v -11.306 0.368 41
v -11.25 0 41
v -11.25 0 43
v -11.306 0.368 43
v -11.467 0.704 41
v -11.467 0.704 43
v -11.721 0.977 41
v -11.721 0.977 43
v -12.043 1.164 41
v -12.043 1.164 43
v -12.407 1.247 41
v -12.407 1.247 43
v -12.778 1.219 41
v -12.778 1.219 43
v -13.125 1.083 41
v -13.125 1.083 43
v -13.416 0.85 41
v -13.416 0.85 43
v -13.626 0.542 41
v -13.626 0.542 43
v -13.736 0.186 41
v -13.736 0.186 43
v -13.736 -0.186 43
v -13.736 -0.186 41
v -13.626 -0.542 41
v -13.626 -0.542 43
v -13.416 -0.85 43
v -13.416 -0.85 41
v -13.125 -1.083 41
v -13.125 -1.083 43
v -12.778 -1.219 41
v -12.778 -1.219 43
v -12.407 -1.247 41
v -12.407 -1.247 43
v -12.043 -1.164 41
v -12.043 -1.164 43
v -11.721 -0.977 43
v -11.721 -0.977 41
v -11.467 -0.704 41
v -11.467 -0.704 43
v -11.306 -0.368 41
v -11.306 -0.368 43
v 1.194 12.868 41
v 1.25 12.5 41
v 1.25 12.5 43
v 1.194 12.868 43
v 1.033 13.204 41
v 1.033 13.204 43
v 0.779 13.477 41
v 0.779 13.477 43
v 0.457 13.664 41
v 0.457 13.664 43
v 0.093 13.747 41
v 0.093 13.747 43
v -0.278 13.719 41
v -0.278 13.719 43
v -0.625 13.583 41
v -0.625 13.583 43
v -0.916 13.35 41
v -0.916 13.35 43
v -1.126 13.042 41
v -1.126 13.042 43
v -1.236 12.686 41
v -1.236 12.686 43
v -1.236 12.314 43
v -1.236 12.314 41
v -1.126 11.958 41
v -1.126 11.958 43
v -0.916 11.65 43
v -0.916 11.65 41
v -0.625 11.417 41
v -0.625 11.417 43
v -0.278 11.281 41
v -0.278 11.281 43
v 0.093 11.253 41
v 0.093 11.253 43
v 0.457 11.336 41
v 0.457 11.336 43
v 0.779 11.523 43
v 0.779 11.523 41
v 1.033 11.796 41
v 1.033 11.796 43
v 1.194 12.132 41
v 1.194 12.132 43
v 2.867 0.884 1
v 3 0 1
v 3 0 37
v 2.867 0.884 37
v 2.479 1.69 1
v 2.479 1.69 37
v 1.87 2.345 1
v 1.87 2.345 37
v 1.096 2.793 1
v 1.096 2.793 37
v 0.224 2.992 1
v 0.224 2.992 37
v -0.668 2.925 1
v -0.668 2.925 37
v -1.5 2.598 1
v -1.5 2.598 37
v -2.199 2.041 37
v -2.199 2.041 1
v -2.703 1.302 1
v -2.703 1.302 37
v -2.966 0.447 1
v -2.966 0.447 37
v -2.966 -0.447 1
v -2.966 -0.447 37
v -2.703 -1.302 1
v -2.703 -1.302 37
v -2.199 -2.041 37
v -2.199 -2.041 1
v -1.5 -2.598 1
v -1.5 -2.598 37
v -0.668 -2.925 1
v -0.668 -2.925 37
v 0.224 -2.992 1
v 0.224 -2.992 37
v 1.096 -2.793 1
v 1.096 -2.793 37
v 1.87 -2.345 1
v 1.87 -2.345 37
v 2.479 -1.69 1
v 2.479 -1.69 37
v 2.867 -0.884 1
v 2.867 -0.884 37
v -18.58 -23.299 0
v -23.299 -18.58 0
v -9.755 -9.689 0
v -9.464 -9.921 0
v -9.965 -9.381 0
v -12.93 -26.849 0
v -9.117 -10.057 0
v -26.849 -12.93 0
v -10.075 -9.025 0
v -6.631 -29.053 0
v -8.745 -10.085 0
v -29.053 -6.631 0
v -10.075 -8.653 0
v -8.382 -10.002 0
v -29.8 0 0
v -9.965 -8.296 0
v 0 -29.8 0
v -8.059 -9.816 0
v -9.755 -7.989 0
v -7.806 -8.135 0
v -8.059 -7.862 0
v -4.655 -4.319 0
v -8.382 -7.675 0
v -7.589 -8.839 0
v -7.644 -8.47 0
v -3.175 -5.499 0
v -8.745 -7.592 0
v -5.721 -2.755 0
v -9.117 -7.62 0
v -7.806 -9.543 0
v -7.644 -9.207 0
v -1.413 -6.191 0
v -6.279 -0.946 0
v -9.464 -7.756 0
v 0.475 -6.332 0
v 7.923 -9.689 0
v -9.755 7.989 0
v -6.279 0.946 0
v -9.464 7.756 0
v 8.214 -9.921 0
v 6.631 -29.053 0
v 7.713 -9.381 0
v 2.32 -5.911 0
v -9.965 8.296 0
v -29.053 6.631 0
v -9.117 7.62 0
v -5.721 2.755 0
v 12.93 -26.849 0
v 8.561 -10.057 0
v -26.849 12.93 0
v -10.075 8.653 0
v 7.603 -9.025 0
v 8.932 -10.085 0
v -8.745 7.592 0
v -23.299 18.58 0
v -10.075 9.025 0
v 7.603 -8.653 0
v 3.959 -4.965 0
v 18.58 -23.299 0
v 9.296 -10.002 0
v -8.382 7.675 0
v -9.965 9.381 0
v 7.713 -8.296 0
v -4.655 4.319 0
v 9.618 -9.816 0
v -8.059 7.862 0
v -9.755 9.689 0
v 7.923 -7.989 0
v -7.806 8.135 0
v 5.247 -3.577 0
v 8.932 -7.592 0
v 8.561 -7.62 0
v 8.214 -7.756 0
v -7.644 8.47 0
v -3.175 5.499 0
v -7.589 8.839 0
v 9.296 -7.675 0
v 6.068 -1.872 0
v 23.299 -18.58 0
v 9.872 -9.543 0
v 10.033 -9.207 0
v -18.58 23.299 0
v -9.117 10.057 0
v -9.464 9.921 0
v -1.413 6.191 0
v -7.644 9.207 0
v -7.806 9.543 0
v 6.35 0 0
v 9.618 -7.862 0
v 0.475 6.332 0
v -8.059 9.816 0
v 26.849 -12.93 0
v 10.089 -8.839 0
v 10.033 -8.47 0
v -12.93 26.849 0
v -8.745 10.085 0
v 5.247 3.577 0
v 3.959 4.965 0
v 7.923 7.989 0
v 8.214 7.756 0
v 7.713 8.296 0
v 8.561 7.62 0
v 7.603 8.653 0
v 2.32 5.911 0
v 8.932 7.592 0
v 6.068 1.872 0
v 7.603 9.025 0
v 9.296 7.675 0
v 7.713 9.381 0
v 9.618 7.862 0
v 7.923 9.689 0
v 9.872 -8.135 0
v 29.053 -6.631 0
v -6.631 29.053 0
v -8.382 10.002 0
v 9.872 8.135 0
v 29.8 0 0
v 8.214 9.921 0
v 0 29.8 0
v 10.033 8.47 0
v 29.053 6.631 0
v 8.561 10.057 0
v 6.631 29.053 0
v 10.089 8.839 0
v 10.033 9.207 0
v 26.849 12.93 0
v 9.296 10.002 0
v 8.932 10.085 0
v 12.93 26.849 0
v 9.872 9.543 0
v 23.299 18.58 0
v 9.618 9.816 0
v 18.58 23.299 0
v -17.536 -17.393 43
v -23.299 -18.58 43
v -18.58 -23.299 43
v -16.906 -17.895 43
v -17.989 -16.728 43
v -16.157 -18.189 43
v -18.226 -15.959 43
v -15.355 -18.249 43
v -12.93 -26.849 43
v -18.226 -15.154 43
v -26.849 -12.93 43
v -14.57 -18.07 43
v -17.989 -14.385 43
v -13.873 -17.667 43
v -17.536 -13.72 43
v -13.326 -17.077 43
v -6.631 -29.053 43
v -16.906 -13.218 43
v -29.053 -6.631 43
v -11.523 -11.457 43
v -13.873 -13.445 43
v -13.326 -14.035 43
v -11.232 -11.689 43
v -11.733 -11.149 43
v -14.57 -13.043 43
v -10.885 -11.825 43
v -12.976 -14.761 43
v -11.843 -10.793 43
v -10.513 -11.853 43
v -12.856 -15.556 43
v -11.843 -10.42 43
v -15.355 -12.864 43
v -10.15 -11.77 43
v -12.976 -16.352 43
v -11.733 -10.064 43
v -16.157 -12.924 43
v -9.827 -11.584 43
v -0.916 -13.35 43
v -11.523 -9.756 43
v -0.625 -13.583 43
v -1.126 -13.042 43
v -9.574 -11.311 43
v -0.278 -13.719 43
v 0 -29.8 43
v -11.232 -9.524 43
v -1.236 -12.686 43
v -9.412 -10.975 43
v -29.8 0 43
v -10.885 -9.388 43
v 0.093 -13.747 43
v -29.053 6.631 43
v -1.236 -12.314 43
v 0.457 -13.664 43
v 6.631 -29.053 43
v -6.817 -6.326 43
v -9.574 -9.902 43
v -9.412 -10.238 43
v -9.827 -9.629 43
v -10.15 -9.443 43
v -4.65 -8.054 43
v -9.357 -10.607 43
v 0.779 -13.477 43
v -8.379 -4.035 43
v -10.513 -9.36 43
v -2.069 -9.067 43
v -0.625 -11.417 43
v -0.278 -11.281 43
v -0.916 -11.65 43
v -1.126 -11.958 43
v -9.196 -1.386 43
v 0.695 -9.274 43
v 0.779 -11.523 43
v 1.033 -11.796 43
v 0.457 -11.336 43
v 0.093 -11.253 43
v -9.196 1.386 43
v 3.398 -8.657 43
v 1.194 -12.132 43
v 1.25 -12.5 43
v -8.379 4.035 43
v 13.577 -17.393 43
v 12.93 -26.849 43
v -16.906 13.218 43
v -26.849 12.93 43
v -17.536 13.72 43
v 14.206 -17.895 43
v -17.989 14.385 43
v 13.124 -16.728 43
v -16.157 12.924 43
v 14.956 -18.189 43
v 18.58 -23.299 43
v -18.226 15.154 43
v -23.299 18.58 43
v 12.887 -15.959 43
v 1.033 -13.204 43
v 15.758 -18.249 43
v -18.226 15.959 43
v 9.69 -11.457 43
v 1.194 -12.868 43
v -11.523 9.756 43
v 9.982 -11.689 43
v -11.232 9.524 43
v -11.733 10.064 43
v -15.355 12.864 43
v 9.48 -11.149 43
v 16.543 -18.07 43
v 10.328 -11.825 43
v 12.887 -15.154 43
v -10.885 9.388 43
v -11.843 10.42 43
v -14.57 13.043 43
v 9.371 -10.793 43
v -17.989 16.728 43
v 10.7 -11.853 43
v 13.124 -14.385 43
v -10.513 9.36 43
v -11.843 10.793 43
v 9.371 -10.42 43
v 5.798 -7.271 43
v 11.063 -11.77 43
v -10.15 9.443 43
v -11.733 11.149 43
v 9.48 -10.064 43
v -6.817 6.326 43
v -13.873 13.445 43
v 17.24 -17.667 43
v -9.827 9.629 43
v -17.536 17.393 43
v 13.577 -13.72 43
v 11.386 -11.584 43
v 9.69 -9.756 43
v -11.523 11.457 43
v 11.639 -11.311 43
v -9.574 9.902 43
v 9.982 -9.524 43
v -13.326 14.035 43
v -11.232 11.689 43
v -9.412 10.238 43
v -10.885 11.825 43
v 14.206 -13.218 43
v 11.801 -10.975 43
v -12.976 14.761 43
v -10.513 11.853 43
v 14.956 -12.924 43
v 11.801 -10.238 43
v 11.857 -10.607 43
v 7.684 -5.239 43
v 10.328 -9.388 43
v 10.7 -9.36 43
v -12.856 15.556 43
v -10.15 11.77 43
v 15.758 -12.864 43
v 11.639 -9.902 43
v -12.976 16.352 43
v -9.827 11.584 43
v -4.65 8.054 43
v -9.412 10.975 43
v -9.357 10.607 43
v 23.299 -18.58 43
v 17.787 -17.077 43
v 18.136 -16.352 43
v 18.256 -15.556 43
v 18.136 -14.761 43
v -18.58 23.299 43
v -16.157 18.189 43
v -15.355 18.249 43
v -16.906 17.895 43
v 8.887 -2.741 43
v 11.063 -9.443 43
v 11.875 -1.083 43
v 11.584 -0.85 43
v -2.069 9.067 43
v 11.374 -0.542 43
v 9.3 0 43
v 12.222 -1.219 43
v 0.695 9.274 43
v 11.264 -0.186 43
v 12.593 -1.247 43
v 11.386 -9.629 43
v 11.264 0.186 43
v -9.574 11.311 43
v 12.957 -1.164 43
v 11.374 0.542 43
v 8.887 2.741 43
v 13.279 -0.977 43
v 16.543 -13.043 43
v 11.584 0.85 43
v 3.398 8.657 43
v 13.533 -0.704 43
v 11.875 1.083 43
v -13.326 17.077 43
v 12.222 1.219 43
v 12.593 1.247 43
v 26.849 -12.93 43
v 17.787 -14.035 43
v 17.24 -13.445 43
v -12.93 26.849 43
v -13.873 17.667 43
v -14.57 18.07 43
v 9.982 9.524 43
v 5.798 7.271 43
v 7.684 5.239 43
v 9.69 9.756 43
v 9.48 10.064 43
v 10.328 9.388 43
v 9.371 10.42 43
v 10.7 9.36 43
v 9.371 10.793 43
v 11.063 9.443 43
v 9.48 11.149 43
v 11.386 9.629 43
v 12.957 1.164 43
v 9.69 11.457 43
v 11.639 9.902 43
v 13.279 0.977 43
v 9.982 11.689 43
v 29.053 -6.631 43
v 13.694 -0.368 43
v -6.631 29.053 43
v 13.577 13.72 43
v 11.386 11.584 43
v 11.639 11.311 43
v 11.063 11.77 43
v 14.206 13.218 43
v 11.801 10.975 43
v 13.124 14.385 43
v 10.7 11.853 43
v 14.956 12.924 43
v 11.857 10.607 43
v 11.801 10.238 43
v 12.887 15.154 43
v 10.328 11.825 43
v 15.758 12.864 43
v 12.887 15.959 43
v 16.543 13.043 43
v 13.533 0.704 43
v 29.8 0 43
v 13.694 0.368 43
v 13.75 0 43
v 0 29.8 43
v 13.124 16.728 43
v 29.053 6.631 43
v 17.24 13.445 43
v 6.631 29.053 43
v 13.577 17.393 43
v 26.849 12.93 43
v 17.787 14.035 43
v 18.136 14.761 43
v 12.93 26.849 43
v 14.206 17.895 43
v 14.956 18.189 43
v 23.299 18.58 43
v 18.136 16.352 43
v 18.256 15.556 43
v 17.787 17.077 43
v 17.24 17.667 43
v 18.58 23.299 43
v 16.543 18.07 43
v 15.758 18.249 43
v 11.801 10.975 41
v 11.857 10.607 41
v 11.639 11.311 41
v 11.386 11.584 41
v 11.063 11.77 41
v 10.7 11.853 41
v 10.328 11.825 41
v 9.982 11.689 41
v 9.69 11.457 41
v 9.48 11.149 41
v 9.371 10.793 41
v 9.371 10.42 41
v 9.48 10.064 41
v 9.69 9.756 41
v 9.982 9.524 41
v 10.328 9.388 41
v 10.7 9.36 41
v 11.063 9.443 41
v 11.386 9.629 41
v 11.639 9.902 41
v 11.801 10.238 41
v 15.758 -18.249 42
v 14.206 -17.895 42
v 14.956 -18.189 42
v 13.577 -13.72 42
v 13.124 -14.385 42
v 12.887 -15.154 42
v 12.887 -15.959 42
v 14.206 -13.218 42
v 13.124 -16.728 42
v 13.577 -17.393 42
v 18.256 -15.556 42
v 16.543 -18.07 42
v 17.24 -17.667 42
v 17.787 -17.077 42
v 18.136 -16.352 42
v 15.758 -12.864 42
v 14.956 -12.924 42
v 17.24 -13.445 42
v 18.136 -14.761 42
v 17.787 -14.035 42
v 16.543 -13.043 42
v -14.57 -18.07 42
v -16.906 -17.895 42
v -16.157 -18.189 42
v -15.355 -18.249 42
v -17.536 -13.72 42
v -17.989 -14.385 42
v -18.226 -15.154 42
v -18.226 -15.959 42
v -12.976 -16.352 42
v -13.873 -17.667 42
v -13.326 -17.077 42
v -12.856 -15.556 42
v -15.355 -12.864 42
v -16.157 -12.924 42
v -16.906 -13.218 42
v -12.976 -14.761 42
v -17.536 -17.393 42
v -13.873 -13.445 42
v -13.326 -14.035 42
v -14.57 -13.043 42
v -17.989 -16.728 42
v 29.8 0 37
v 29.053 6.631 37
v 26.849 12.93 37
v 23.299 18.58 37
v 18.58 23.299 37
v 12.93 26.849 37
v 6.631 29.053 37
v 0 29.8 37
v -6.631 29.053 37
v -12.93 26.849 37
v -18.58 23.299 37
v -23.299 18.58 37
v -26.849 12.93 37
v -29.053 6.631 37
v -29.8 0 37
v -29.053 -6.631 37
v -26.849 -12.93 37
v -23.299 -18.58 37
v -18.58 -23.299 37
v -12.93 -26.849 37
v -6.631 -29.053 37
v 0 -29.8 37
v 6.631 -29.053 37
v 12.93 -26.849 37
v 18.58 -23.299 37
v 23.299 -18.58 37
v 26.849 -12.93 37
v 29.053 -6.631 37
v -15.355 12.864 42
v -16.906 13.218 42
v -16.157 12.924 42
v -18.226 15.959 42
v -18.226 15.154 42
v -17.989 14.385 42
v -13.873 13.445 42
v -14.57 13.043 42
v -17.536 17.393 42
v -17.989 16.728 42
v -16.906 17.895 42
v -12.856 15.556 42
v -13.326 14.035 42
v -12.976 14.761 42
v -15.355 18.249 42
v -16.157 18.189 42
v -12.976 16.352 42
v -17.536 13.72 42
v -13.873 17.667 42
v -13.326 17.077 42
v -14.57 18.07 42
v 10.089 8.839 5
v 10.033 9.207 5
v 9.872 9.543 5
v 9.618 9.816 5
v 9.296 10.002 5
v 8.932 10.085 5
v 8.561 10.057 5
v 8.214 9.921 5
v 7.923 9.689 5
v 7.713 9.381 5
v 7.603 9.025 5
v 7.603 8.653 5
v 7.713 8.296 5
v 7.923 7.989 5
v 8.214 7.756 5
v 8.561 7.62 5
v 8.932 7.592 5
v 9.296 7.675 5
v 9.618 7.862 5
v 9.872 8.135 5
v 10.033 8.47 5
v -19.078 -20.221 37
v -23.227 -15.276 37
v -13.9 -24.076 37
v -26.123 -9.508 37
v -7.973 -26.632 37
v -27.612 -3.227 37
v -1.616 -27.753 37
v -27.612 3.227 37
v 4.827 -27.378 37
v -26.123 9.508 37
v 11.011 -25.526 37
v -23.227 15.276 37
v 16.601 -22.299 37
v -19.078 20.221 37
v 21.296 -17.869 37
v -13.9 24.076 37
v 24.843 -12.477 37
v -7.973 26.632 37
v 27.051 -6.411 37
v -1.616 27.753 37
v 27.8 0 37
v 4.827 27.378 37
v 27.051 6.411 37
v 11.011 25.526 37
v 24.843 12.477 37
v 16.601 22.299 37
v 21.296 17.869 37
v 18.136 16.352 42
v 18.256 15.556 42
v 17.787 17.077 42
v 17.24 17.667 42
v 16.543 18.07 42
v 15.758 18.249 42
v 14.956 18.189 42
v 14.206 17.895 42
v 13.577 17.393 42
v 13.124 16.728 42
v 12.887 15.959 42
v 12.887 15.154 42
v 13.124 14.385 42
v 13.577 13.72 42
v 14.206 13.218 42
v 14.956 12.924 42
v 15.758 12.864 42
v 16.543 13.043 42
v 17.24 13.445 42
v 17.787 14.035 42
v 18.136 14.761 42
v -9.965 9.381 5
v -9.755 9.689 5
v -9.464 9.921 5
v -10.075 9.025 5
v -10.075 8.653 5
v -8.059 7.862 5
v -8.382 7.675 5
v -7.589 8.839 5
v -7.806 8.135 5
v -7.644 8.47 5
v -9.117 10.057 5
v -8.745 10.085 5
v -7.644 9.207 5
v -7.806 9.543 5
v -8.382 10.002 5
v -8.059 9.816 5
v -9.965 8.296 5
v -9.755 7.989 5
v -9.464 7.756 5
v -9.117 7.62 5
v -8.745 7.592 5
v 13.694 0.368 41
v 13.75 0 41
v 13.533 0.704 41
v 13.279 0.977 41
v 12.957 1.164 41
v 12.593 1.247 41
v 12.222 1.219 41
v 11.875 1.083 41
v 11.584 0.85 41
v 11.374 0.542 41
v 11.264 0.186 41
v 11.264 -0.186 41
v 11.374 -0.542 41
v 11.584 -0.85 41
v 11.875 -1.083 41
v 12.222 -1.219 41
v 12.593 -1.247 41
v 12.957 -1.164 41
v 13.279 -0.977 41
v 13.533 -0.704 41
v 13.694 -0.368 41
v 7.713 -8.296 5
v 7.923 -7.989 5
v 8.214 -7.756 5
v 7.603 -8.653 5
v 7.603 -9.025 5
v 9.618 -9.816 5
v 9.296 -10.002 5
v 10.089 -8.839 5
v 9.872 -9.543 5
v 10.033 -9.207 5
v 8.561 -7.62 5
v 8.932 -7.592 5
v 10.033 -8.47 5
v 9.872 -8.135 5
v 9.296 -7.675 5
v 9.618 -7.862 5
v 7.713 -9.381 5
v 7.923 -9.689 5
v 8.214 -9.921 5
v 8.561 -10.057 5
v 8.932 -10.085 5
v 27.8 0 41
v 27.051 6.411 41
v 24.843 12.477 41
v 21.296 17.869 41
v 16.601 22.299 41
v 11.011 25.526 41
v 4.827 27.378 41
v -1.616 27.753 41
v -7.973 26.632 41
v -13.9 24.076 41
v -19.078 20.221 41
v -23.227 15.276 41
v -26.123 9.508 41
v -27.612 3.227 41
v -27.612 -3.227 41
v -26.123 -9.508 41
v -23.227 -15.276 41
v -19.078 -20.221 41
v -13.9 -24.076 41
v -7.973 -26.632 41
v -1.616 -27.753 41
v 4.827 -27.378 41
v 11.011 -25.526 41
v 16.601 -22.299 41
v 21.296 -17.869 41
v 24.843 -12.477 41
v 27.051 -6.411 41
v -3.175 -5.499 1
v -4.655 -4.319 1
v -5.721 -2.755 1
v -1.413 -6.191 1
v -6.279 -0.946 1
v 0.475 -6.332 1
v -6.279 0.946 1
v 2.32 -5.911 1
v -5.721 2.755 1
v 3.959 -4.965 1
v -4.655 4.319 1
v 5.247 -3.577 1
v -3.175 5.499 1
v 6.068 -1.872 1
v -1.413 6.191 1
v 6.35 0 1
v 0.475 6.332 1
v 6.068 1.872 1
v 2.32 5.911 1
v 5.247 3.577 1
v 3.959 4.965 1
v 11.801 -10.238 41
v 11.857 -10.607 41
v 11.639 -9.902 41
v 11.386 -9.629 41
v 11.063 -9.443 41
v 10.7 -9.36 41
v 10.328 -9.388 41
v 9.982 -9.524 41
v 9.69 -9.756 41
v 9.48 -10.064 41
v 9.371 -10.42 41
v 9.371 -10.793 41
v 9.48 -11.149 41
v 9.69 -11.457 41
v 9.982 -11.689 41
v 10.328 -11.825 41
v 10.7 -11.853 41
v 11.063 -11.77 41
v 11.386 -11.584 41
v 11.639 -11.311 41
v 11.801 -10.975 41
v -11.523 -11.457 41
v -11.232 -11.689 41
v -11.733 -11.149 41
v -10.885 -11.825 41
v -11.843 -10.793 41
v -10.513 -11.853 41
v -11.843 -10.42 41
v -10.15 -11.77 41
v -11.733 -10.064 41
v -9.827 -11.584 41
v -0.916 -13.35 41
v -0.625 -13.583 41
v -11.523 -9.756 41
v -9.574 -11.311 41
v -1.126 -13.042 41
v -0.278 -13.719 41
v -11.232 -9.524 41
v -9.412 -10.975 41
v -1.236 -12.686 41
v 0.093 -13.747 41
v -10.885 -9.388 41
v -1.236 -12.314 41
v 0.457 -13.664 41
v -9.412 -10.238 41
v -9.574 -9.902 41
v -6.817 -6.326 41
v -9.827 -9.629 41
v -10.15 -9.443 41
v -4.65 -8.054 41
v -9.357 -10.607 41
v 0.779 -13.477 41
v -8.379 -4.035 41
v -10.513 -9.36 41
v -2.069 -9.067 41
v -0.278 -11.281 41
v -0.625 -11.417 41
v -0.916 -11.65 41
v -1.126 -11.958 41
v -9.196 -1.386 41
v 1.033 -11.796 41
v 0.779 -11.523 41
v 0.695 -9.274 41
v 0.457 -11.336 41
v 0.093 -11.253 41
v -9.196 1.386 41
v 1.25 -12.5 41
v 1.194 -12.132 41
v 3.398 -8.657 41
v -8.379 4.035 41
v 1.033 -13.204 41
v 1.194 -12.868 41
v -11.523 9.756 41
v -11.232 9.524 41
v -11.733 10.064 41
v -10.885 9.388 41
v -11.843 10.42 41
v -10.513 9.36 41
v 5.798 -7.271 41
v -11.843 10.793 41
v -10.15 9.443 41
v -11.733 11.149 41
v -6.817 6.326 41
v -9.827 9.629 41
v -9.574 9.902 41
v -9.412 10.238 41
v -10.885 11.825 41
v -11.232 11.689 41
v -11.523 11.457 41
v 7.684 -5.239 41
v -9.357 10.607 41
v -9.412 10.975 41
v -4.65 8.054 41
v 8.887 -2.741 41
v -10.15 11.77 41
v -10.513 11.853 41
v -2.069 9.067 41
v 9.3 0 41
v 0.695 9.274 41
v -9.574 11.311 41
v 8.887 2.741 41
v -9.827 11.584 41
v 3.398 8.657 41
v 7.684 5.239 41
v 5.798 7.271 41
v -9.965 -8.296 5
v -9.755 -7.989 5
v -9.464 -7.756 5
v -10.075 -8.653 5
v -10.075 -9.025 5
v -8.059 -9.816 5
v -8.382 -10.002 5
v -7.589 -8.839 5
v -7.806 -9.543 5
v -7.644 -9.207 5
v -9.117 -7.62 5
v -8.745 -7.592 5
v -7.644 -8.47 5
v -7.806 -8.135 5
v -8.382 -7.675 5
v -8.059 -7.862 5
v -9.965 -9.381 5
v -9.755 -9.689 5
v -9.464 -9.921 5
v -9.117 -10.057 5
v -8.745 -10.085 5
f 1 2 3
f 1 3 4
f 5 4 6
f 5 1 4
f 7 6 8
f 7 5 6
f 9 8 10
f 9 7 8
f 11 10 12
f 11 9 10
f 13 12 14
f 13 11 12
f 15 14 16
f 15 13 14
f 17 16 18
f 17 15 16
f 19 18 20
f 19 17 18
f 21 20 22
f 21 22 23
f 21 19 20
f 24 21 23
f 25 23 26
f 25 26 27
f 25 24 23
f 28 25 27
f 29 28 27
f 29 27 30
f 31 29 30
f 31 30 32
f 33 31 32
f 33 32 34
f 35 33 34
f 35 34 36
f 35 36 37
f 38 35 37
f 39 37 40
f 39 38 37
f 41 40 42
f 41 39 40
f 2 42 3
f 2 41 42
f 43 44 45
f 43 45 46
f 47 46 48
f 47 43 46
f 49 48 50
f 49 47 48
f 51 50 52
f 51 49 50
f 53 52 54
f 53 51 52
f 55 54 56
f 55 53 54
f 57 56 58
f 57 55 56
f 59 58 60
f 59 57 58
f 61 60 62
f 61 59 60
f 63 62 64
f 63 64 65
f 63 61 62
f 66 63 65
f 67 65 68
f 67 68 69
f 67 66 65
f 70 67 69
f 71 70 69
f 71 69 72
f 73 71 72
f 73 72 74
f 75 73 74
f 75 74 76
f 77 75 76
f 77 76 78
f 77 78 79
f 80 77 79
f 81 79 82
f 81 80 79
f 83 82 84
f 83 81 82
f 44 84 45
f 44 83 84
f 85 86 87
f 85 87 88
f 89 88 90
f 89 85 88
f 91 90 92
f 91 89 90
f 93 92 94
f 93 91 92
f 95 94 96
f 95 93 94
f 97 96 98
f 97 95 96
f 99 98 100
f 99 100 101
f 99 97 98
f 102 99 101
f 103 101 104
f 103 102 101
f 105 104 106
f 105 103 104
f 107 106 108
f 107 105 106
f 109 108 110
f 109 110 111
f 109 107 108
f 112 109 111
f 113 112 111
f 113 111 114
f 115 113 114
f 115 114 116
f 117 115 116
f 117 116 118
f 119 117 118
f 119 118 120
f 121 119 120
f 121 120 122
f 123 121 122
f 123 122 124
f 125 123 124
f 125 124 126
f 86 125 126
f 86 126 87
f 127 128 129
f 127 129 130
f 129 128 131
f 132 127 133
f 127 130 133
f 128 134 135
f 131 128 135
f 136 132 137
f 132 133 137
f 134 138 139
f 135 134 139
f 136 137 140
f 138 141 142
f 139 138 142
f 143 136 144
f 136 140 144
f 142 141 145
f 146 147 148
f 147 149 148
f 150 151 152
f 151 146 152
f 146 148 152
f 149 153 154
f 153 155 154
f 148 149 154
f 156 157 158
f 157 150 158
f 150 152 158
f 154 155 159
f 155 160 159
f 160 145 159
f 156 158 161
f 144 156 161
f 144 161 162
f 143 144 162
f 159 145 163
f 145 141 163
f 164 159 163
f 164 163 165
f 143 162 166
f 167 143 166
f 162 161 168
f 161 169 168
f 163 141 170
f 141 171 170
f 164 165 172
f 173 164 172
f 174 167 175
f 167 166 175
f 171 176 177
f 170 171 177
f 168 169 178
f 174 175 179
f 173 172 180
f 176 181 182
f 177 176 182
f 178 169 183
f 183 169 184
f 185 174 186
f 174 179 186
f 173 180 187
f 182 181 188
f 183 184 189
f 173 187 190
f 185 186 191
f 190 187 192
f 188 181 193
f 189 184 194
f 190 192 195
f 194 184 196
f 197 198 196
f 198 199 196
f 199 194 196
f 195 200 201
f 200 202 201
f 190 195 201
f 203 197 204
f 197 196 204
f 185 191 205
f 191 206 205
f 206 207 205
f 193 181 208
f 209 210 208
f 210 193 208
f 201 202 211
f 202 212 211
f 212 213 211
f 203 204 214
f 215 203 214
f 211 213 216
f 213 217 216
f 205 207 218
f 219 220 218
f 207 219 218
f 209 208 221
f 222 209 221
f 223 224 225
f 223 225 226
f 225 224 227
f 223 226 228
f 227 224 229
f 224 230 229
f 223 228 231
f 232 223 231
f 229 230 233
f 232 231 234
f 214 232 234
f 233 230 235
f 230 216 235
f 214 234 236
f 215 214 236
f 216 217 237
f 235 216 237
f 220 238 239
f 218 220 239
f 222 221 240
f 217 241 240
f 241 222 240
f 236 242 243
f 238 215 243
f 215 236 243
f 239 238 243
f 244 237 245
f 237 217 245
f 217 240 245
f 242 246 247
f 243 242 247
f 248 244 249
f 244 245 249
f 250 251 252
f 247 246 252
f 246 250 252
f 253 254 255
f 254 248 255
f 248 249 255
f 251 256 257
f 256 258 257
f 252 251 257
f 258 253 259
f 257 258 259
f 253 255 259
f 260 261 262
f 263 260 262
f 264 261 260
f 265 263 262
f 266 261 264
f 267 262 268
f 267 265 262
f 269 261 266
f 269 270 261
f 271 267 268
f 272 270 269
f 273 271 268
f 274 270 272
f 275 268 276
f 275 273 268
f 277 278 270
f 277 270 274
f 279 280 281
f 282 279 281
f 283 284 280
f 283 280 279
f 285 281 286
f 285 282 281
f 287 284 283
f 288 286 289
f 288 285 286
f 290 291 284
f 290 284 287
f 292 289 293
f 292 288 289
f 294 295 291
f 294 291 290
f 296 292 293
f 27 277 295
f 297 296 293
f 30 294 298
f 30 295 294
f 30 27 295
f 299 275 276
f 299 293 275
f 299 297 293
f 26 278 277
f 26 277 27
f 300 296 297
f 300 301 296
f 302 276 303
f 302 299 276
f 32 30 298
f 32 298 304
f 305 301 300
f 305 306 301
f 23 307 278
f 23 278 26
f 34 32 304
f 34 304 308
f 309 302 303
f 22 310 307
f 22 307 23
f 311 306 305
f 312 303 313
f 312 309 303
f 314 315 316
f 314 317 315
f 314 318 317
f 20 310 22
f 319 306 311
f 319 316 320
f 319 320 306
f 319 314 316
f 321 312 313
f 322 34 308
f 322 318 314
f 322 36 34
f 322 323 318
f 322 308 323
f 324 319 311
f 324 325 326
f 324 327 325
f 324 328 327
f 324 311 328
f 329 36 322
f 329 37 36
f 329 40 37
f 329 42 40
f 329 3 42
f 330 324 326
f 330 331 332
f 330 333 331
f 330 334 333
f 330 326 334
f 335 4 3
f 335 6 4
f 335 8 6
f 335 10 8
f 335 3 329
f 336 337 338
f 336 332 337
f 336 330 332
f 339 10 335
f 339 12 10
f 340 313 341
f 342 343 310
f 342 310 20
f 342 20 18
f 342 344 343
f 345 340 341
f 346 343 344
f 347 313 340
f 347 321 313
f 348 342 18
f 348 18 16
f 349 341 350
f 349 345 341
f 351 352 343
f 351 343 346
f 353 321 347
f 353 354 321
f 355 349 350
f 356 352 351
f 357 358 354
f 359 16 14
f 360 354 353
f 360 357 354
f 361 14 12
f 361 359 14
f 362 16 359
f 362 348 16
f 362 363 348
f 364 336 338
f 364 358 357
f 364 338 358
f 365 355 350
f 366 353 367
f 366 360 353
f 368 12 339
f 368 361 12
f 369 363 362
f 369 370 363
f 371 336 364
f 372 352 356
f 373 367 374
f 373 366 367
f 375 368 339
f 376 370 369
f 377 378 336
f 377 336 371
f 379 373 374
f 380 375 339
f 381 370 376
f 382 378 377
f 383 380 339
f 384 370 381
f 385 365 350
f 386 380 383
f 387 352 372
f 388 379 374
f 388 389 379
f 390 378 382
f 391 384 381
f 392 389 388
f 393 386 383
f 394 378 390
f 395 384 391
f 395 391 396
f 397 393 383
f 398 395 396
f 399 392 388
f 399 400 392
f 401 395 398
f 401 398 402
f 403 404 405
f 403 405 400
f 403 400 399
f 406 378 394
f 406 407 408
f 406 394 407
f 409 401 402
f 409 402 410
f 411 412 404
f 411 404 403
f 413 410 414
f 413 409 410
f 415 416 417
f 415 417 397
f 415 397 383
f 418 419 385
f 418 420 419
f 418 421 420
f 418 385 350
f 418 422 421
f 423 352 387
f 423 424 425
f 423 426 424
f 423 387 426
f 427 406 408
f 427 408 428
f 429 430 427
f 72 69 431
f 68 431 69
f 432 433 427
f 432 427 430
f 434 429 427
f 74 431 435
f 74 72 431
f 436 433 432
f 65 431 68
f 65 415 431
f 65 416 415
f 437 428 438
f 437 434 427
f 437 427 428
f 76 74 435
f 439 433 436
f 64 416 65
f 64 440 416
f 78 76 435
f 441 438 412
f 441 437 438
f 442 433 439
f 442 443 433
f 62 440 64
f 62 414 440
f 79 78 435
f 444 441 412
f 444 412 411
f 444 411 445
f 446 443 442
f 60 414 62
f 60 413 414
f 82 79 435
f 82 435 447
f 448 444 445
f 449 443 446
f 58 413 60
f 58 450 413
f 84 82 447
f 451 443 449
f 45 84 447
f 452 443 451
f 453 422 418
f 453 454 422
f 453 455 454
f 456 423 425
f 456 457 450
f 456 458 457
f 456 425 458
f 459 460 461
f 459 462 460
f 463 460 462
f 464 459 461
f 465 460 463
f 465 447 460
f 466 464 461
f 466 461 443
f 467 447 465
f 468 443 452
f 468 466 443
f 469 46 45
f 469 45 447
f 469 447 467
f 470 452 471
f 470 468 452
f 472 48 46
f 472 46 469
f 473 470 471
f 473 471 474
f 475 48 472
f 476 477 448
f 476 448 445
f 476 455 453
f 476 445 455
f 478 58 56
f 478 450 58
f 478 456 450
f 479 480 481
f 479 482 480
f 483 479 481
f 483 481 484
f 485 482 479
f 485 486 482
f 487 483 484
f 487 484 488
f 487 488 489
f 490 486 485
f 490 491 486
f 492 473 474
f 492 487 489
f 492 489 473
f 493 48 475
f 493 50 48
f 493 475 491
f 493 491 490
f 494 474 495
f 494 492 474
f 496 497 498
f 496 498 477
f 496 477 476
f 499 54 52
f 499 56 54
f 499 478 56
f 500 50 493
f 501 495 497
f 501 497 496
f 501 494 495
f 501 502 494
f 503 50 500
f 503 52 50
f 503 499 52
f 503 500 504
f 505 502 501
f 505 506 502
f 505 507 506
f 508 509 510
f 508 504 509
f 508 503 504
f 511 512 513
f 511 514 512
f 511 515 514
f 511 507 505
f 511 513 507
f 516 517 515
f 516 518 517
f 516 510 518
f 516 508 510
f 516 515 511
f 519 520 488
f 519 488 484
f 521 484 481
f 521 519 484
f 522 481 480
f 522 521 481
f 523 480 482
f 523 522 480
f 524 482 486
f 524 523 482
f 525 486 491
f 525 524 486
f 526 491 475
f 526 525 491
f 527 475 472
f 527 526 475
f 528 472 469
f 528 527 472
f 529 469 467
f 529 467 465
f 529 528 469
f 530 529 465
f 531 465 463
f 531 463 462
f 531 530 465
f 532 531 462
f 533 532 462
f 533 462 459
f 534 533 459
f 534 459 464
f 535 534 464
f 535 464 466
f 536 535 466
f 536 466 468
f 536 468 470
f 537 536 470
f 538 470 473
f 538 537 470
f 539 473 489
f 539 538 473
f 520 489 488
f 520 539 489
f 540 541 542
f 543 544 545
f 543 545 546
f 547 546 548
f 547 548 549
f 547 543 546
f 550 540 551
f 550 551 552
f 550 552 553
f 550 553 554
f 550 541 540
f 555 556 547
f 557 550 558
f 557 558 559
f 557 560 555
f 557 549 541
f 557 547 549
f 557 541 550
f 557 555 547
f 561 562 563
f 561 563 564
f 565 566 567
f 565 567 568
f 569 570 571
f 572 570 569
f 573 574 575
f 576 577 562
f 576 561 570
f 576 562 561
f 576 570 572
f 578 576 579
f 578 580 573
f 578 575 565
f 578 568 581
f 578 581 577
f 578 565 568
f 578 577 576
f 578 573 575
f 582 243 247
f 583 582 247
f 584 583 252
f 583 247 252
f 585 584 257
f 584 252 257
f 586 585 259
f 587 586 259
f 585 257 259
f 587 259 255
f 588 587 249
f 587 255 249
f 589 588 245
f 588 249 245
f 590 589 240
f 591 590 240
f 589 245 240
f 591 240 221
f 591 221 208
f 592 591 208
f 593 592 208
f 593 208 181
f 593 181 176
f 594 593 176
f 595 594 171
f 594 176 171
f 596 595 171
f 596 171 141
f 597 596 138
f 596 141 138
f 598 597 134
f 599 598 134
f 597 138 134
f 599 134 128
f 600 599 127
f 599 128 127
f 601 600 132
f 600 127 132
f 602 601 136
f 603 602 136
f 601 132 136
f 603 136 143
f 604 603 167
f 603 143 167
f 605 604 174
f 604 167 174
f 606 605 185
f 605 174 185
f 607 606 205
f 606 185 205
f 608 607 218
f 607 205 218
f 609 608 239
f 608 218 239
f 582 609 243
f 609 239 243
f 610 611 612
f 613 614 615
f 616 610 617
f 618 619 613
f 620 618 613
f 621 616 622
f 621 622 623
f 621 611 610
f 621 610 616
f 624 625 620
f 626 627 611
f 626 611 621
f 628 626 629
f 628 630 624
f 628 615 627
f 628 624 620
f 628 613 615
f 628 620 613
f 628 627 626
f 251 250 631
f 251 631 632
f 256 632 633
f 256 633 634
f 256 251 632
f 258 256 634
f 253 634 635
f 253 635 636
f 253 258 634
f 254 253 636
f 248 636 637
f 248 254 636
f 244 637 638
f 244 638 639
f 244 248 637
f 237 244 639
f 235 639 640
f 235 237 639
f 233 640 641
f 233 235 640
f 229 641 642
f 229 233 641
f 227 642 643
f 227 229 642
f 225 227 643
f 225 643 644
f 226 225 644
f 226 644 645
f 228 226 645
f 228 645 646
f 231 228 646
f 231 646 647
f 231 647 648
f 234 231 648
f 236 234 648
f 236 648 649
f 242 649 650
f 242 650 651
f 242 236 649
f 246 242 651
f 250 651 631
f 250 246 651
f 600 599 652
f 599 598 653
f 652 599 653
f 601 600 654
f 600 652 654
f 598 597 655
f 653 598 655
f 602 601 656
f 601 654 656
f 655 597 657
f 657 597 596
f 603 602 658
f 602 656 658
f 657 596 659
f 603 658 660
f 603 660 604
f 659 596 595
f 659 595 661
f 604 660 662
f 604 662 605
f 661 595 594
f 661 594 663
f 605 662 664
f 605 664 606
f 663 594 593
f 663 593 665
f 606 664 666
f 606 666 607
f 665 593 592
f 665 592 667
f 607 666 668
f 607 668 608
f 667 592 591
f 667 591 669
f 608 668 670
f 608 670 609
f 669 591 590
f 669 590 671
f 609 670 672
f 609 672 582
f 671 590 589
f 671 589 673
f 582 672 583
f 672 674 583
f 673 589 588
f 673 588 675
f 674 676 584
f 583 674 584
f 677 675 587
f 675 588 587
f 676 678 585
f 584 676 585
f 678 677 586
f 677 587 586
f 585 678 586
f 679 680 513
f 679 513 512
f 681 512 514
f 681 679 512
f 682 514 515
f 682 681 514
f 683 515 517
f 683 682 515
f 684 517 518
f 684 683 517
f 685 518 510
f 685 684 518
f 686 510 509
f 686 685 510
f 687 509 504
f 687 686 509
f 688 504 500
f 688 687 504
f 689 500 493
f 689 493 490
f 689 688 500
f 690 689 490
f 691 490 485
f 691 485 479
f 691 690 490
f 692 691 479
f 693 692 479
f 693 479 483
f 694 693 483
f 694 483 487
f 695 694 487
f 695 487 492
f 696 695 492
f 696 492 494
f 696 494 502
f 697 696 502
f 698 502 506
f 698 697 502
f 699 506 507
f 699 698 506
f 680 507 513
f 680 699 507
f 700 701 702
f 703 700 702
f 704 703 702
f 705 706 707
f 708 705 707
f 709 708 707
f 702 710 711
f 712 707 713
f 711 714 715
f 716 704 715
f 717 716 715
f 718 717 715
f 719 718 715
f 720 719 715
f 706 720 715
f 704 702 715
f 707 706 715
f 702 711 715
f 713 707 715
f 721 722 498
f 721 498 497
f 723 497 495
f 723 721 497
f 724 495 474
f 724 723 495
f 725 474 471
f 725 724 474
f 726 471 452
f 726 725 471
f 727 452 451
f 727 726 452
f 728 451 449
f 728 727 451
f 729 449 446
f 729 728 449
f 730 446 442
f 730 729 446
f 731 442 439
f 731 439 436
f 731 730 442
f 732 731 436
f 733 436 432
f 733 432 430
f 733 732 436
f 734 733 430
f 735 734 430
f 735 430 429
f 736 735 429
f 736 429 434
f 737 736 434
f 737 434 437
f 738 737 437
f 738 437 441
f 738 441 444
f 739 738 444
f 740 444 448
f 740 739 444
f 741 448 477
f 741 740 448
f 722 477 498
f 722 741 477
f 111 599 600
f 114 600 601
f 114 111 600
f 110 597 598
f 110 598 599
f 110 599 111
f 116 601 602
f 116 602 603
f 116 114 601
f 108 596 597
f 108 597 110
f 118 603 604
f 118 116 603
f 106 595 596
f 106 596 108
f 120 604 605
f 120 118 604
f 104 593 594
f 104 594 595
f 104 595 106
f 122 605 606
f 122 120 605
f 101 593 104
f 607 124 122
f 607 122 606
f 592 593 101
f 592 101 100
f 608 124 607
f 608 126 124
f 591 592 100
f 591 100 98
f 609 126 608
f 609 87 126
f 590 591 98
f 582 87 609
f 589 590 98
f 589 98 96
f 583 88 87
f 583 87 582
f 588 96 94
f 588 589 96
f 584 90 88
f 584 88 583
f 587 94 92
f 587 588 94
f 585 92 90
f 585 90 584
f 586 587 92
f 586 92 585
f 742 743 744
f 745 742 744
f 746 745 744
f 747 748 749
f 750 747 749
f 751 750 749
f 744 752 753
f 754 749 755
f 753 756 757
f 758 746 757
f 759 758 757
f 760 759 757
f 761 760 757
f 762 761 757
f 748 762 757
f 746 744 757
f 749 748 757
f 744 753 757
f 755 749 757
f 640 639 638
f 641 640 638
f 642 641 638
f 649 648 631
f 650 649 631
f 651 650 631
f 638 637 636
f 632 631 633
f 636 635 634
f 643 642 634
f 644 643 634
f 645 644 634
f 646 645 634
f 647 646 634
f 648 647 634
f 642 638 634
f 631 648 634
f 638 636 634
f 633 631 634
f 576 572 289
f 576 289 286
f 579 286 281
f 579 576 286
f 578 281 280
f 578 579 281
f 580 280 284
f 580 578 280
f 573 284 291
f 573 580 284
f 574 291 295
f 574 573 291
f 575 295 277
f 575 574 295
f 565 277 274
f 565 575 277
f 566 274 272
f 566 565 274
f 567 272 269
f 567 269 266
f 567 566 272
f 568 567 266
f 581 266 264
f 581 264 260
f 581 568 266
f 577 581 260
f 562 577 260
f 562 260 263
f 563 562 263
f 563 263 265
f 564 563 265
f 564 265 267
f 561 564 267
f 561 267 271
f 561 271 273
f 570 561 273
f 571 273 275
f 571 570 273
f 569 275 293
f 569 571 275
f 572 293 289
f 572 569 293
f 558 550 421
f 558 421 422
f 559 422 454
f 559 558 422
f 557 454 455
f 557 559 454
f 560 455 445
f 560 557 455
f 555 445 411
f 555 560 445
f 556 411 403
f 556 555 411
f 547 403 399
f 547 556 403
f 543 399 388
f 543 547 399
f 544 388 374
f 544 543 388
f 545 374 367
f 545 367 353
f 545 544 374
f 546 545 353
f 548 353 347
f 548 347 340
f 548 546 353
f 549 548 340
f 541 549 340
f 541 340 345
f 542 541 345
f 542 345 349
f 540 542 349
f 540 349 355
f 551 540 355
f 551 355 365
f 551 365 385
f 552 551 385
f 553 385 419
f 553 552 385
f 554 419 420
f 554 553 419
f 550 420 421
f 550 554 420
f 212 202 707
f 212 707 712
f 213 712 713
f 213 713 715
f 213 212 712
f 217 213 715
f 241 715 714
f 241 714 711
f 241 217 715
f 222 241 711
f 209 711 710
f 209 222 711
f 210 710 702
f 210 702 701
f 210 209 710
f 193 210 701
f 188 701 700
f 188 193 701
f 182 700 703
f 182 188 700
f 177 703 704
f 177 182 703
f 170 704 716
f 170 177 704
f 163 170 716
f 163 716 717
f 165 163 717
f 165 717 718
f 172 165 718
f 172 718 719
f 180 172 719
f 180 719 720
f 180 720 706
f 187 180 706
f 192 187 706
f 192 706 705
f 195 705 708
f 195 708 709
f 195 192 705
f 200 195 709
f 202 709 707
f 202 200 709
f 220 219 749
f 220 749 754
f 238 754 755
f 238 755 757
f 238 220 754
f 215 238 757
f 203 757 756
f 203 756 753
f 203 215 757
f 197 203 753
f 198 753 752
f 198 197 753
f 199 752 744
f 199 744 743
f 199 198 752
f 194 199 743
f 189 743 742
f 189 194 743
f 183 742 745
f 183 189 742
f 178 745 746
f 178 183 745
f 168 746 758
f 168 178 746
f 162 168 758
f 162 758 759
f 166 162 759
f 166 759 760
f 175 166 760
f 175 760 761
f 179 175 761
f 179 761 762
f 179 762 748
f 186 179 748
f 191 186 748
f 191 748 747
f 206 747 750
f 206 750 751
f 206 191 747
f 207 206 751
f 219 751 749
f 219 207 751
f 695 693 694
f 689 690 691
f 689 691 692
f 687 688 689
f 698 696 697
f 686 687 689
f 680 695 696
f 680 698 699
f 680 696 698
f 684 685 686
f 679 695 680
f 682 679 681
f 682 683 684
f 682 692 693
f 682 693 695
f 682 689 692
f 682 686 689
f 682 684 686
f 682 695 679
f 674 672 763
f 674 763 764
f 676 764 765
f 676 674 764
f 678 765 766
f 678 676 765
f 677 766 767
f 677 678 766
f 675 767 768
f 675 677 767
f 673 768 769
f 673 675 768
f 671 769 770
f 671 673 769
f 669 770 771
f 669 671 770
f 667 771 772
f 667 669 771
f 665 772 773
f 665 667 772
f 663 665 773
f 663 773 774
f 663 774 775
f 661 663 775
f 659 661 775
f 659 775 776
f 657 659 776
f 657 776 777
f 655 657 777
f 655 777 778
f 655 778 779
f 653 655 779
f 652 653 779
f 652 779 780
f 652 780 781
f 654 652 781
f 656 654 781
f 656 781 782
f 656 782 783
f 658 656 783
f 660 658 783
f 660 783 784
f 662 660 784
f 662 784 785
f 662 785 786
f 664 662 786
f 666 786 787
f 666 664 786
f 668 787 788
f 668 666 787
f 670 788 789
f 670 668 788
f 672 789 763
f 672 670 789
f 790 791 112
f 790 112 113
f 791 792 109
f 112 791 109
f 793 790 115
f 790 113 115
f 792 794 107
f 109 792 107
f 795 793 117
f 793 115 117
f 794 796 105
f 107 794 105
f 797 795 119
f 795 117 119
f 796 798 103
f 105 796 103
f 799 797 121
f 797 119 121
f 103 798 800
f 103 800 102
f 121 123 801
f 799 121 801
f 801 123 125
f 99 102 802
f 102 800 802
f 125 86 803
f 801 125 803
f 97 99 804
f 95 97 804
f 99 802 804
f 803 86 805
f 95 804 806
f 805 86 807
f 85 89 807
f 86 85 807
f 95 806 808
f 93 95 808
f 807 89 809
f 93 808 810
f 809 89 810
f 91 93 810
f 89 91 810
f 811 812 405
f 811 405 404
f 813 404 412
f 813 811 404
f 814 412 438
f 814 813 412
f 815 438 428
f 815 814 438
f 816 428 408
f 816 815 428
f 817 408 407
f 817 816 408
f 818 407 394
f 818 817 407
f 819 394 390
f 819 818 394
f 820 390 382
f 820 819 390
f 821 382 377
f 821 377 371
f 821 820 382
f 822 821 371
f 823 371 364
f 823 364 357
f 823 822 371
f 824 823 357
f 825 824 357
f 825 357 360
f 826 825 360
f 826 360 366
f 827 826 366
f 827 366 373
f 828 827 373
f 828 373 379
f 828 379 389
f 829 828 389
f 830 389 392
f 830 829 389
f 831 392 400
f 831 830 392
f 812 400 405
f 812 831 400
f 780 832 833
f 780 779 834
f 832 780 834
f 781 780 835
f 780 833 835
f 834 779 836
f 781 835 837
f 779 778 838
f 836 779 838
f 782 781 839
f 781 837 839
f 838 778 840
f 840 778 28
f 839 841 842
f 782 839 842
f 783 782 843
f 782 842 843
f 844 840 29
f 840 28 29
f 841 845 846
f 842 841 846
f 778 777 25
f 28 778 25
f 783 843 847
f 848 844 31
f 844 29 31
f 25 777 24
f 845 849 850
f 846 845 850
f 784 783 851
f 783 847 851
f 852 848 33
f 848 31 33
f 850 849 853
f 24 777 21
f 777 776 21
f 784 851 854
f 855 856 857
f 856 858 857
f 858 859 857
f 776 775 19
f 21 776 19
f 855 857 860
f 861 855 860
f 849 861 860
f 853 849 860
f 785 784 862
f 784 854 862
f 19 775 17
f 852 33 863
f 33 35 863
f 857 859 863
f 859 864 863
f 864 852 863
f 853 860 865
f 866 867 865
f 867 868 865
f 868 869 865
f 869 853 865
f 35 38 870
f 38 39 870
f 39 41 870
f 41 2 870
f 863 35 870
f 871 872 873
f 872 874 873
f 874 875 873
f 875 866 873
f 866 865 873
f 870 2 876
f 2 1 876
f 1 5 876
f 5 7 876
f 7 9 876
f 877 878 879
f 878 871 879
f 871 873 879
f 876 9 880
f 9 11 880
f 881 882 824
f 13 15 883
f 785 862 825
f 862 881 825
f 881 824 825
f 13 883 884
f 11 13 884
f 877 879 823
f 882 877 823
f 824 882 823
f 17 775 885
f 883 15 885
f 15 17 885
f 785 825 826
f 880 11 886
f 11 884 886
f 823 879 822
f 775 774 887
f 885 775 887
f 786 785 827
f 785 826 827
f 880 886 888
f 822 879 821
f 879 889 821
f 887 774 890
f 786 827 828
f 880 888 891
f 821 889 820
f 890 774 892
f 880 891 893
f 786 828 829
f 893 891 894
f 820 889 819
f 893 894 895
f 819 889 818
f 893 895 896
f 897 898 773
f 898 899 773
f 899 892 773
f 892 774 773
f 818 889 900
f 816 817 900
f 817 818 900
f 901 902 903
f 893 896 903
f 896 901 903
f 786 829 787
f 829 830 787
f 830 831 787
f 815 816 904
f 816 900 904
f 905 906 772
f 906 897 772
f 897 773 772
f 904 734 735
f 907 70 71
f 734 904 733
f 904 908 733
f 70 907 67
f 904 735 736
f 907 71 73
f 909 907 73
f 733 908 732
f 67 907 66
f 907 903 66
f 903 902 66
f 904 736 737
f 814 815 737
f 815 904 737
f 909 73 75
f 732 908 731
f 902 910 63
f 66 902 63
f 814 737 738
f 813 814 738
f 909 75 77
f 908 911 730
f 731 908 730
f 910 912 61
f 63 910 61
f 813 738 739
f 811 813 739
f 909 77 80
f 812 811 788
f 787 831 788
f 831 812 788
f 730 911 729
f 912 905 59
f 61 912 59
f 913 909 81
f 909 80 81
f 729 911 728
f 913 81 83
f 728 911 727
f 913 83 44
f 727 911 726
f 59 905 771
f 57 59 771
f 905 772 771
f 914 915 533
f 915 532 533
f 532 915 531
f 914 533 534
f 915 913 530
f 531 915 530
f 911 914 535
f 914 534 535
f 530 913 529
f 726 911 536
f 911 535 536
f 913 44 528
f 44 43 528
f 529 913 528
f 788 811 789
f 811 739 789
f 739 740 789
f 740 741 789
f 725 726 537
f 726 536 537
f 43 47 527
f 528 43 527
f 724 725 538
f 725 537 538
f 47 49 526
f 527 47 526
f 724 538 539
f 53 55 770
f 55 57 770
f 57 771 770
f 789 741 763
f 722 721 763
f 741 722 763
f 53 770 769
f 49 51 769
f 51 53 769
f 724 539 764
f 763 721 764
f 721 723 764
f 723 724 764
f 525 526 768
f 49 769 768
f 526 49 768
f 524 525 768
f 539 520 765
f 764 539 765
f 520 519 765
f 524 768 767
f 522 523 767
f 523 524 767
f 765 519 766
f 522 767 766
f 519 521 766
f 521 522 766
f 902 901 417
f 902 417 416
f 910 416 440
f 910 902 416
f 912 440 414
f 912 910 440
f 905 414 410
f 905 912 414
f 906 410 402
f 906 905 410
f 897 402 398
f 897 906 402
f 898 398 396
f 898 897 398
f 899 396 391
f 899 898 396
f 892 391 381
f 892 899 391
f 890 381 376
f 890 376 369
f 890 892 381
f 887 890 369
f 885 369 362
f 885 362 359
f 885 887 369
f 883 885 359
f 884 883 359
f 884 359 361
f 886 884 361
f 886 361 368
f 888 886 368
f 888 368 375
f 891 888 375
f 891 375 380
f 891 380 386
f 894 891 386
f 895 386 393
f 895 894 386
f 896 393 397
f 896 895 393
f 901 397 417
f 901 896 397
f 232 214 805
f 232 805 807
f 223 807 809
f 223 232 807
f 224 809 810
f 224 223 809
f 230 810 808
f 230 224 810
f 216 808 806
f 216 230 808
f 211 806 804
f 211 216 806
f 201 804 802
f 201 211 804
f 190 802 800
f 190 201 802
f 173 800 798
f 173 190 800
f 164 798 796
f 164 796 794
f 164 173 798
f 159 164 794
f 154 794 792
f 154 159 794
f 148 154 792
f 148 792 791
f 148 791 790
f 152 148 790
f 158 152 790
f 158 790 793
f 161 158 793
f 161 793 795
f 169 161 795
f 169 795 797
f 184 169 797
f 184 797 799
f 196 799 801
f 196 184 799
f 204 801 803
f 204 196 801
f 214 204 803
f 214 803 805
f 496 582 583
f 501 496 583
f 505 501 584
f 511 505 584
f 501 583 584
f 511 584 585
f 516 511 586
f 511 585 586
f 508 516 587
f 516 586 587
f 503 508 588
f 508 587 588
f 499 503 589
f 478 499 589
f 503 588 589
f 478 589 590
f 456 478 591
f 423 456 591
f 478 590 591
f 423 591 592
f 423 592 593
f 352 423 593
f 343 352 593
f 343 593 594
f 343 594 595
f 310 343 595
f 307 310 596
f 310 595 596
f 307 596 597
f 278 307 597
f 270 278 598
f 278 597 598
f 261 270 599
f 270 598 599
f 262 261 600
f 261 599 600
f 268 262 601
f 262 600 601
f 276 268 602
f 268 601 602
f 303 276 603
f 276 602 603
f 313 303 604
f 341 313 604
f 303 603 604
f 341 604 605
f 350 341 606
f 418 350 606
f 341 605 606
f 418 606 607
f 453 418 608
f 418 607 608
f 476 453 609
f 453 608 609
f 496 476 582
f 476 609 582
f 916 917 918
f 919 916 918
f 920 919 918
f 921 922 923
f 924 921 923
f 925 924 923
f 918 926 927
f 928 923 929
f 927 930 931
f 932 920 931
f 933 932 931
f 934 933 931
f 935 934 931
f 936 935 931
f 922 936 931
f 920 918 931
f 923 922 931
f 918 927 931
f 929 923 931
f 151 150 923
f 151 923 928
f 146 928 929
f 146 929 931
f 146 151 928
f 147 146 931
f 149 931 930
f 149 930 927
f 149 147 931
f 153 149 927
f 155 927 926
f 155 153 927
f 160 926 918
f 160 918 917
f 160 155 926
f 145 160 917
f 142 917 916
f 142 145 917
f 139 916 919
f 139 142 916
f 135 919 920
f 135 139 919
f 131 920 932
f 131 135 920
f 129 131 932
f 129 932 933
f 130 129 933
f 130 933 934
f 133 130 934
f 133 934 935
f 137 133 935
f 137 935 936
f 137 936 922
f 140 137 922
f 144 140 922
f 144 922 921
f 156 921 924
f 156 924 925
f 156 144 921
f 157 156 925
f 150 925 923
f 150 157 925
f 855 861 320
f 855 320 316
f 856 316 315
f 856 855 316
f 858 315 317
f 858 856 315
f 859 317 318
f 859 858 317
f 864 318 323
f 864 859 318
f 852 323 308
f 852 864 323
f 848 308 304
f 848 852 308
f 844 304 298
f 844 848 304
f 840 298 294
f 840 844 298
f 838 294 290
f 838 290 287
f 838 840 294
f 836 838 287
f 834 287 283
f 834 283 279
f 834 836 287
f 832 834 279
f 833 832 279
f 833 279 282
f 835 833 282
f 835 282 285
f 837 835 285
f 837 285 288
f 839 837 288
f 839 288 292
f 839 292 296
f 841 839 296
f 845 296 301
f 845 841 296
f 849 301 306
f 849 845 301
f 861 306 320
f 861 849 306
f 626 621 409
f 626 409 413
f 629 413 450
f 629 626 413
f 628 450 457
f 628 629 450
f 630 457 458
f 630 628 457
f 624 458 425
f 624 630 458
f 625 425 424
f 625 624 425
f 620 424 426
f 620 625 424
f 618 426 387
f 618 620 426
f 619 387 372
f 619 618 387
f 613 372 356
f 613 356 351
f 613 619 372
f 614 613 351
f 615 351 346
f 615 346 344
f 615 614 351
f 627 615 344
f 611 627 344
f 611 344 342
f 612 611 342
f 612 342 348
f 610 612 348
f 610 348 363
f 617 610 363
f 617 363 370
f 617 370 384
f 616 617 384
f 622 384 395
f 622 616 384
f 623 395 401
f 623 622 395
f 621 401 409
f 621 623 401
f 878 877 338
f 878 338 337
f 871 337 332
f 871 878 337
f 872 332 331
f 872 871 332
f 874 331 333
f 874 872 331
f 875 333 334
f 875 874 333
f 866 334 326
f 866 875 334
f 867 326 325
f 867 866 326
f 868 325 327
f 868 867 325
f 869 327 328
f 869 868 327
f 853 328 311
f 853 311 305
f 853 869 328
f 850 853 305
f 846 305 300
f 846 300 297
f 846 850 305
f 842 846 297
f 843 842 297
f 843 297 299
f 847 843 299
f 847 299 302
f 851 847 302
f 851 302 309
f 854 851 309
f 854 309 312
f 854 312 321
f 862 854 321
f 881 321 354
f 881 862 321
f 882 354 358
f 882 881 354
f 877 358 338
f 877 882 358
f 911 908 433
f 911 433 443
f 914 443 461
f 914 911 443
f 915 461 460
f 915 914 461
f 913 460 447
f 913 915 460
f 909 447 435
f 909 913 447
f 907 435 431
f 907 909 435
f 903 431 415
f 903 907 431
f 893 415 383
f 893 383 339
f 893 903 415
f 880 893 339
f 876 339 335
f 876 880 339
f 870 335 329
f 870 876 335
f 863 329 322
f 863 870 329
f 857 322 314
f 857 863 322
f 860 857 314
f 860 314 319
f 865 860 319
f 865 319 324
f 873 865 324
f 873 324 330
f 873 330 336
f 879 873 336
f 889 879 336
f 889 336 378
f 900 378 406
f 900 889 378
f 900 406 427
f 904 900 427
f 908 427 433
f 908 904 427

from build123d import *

# Parameters (mm, degrees)
SKETCH_1_R                                       = 29.8
SKETCH_1_R_2                                     = 3
F_01_MAINHOUSING_OD59_6_L37_DEPTH                = 37
SKETCH_2_R                                       = 6.35
F_02_FRONTBEARINGSEAT_D12_7_DEPTH1_ASSUMED_DEPTH = 1
ROTOR_FRONT_PCD25_CLOCKED45_RELATIVE_TO_R        = 1.25
F_03_FRONT_4XM3_PCD25_DEPTH5_ASSUMED_DEPTH       = 5
F_04_ENCODERCOVER_RIM_L6_ASSUMED_START           = 37
SKETCH_4_R                                       = 29.8
SKETCH_4_R_2                                     = 27.8
F_04_ENCODERCOVER_RIM_L6_ASSUMED_DEPTH           = 6
F_05_ENCODERCOVER_FACE_T2_ASSUMED_START          = 41
SKETCH_5_R                                       = 27.8
SKETCH_5_R_2                                     = 9.3
F_05_ENCODERCOVER_FACE_T2_ASSUMED_DEPTH          = 2
F_06_COVER_4XM3_PCD25_ASSUMED_START              = 41
SKETCH_6_R                                       = 1.25
F_06_COVER_4XM3_PCD25_ASSUMED_DEPTH              = 2
F_07_COVER_4XM3_PCD30_ASSUMED_START              = 41
SKETCH_7_R                                       = 1.25
F_07_COVER_4XM3_PCD30_ASSUMED_DEPTH              = 2
F_08_COVER_4XFASTENERSEATS_PCD44_ASSUMED_START   = 42
SKETCH_8_R                                       = 2.7
F_08_COVER_4XFASTENERSEATS_PCD44_ASSUMED_DEPTH   = 1


with BuildPart() as part:
    # 草图1 → 01_MainHousing_OD59.6_L37 (new body)
    with BuildSketch(Plane.XY):
        Circle(SKETCH_1_R)
        Circle(SKETCH_1_R_2, mode=Mode.SUBTRACT)
    extrude(amount=F_01_MAINHOUSING_OD59_6_L37_DEPTH)

    # 草图2 → 02_FrontBearingSeat_D12.7_Depth1_ASSUMED (cut)
    with BuildSketch(Plane.XY):
        Circle(SKETCH_2_R)
    extrude(amount=F_02_FRONTBEARINGSEAT_D12_7_DEPTH1_ASSUMED_DEPTH, mode=Mode.SUBTRACT)

    # Rotor_front_PCD25_clocked45_relative_to_stator → 03_Front_4xM3_PCD25_Depth5_ASSUMED (cut)
    with BuildSketch(Plane.XY):
        with Locations((8.838834765, 8.838834765)):
            Circle(ROTOR_FRONT_PCD25_CLOCKED45_RELATIVE_TO_R)
        with Locations((-8.838834765, 8.838834765)):
            Circle(ROTOR_FRONT_PCD25_CLOCKED45_RELATIVE_TO_R)
        with Locations((-8.838834765, -8.838834765)):
            Circle(ROTOR_FRONT_PCD25_CLOCKED45_RELATIVE_TO_R)
        with Locations((8.838834765, -8.838834765)):
            Circle(ROTOR_FRONT_PCD25_CLOCKED45_RELATIVE_TO_R)
    extrude(amount=F_03_FRONT_4XM3_PCD25_DEPTH5_ASSUMED_DEPTH, mode=Mode.SUBTRACT)


with BuildPart() as body_2:
    # 草图4 → 04_EncoderCover_Rim_L6_ASSUMED (new body)
    with BuildSketch(Plane.XY.offset(F_04_ENCODERCOVER_RIM_L6_ASSUMED_START)):
        Circle(SKETCH_4_R)
        Circle(SKETCH_4_R_2, mode=Mode.SUBTRACT)
    extrude(amount=F_04_ENCODERCOVER_RIM_L6_ASSUMED_DEPTH)

    # 草图5 → 05_EncoderCover_Face_T2_ASSUMED (add)
    with BuildSketch(Plane.XY.offset(F_05_ENCODERCOVER_FACE_T2_ASSUMED_START)):
        Circle(SKETCH_5_R)
        Circle(SKETCH_5_R_2, mode=Mode.SUBTRACT)
    extrude(amount=F_05_ENCODERCOVER_FACE_T2_ASSUMED_DEPTH)

    # 草图6 → 06_Cover_4xM3_PCD25_ASSUMED (cut)
    with BuildSketch(Plane.XY.offset(F_06_COVER_4XM3_PCD25_ASSUMED_START)):
        with Locations((12.5, 0)):
            Circle(SKETCH_6_R)
        with Locations((0, 12.5)):
            Circle(SKETCH_6_R)
        with Locations((-12.5, 0)):
            Circle(SKETCH_6_R)
        with Locations((0, -12.5)):
            Circle(SKETCH_6_R)
    extrude(amount=F_06_COVER_4XM3_PCD25_ASSUMED_DEPTH, mode=Mode.SUBTRACT)

    # 草图7 → 07_Cover_4xM3_PCD30_ASSUMED (cut)
    with BuildSketch(Plane.XY.offset(F_07_COVER_4XM3_PCD30_ASSUMED_START)):
        with Locations((10.606601718, 10.606601718)):
            Circle(SKETCH_7_R)
        with Locations((-10.606601718, 10.606601718)):
            Circle(SKETCH_7_R)
        with Locations((-10.606601718, -10.606601718)):
            Circle(SKETCH_7_R)
        with Locations((10.606601718, -10.606601718)):
            Circle(SKETCH_7_R)
    extrude(amount=F_07_COVER_4XM3_PCD30_ASSUMED_DEPTH, mode=Mode.SUBTRACT)

    # 草图8 → 08_Cover_4xFastenerSeats_PCD44_ASSUMED (cut)
    with BuildSketch(Plane.XY.offset(F_08_COVER_4XFASTENERSEATS_PCD44_ASSUMED_START)):
        with Locations((15.556349186, 15.556349186)):
            Circle(SKETCH_8_R)
        with Locations((-15.556349186, 15.556349186)):
            Circle(SKETCH_8_R)
        with Locations((-15.556349186, -15.556349186)):
            Circle(SKETCH_8_R)
        with Locations((15.556349186, -15.556349186)):
            Circle(SKETCH_8_R)
    extrude(amount=F_08_COVER_4XFASTENERSEATS_PCD44_ASSUMED_DEPTH, mode=Mode.SUBTRACT)


solid = Compound([part.part, body_2.part])
